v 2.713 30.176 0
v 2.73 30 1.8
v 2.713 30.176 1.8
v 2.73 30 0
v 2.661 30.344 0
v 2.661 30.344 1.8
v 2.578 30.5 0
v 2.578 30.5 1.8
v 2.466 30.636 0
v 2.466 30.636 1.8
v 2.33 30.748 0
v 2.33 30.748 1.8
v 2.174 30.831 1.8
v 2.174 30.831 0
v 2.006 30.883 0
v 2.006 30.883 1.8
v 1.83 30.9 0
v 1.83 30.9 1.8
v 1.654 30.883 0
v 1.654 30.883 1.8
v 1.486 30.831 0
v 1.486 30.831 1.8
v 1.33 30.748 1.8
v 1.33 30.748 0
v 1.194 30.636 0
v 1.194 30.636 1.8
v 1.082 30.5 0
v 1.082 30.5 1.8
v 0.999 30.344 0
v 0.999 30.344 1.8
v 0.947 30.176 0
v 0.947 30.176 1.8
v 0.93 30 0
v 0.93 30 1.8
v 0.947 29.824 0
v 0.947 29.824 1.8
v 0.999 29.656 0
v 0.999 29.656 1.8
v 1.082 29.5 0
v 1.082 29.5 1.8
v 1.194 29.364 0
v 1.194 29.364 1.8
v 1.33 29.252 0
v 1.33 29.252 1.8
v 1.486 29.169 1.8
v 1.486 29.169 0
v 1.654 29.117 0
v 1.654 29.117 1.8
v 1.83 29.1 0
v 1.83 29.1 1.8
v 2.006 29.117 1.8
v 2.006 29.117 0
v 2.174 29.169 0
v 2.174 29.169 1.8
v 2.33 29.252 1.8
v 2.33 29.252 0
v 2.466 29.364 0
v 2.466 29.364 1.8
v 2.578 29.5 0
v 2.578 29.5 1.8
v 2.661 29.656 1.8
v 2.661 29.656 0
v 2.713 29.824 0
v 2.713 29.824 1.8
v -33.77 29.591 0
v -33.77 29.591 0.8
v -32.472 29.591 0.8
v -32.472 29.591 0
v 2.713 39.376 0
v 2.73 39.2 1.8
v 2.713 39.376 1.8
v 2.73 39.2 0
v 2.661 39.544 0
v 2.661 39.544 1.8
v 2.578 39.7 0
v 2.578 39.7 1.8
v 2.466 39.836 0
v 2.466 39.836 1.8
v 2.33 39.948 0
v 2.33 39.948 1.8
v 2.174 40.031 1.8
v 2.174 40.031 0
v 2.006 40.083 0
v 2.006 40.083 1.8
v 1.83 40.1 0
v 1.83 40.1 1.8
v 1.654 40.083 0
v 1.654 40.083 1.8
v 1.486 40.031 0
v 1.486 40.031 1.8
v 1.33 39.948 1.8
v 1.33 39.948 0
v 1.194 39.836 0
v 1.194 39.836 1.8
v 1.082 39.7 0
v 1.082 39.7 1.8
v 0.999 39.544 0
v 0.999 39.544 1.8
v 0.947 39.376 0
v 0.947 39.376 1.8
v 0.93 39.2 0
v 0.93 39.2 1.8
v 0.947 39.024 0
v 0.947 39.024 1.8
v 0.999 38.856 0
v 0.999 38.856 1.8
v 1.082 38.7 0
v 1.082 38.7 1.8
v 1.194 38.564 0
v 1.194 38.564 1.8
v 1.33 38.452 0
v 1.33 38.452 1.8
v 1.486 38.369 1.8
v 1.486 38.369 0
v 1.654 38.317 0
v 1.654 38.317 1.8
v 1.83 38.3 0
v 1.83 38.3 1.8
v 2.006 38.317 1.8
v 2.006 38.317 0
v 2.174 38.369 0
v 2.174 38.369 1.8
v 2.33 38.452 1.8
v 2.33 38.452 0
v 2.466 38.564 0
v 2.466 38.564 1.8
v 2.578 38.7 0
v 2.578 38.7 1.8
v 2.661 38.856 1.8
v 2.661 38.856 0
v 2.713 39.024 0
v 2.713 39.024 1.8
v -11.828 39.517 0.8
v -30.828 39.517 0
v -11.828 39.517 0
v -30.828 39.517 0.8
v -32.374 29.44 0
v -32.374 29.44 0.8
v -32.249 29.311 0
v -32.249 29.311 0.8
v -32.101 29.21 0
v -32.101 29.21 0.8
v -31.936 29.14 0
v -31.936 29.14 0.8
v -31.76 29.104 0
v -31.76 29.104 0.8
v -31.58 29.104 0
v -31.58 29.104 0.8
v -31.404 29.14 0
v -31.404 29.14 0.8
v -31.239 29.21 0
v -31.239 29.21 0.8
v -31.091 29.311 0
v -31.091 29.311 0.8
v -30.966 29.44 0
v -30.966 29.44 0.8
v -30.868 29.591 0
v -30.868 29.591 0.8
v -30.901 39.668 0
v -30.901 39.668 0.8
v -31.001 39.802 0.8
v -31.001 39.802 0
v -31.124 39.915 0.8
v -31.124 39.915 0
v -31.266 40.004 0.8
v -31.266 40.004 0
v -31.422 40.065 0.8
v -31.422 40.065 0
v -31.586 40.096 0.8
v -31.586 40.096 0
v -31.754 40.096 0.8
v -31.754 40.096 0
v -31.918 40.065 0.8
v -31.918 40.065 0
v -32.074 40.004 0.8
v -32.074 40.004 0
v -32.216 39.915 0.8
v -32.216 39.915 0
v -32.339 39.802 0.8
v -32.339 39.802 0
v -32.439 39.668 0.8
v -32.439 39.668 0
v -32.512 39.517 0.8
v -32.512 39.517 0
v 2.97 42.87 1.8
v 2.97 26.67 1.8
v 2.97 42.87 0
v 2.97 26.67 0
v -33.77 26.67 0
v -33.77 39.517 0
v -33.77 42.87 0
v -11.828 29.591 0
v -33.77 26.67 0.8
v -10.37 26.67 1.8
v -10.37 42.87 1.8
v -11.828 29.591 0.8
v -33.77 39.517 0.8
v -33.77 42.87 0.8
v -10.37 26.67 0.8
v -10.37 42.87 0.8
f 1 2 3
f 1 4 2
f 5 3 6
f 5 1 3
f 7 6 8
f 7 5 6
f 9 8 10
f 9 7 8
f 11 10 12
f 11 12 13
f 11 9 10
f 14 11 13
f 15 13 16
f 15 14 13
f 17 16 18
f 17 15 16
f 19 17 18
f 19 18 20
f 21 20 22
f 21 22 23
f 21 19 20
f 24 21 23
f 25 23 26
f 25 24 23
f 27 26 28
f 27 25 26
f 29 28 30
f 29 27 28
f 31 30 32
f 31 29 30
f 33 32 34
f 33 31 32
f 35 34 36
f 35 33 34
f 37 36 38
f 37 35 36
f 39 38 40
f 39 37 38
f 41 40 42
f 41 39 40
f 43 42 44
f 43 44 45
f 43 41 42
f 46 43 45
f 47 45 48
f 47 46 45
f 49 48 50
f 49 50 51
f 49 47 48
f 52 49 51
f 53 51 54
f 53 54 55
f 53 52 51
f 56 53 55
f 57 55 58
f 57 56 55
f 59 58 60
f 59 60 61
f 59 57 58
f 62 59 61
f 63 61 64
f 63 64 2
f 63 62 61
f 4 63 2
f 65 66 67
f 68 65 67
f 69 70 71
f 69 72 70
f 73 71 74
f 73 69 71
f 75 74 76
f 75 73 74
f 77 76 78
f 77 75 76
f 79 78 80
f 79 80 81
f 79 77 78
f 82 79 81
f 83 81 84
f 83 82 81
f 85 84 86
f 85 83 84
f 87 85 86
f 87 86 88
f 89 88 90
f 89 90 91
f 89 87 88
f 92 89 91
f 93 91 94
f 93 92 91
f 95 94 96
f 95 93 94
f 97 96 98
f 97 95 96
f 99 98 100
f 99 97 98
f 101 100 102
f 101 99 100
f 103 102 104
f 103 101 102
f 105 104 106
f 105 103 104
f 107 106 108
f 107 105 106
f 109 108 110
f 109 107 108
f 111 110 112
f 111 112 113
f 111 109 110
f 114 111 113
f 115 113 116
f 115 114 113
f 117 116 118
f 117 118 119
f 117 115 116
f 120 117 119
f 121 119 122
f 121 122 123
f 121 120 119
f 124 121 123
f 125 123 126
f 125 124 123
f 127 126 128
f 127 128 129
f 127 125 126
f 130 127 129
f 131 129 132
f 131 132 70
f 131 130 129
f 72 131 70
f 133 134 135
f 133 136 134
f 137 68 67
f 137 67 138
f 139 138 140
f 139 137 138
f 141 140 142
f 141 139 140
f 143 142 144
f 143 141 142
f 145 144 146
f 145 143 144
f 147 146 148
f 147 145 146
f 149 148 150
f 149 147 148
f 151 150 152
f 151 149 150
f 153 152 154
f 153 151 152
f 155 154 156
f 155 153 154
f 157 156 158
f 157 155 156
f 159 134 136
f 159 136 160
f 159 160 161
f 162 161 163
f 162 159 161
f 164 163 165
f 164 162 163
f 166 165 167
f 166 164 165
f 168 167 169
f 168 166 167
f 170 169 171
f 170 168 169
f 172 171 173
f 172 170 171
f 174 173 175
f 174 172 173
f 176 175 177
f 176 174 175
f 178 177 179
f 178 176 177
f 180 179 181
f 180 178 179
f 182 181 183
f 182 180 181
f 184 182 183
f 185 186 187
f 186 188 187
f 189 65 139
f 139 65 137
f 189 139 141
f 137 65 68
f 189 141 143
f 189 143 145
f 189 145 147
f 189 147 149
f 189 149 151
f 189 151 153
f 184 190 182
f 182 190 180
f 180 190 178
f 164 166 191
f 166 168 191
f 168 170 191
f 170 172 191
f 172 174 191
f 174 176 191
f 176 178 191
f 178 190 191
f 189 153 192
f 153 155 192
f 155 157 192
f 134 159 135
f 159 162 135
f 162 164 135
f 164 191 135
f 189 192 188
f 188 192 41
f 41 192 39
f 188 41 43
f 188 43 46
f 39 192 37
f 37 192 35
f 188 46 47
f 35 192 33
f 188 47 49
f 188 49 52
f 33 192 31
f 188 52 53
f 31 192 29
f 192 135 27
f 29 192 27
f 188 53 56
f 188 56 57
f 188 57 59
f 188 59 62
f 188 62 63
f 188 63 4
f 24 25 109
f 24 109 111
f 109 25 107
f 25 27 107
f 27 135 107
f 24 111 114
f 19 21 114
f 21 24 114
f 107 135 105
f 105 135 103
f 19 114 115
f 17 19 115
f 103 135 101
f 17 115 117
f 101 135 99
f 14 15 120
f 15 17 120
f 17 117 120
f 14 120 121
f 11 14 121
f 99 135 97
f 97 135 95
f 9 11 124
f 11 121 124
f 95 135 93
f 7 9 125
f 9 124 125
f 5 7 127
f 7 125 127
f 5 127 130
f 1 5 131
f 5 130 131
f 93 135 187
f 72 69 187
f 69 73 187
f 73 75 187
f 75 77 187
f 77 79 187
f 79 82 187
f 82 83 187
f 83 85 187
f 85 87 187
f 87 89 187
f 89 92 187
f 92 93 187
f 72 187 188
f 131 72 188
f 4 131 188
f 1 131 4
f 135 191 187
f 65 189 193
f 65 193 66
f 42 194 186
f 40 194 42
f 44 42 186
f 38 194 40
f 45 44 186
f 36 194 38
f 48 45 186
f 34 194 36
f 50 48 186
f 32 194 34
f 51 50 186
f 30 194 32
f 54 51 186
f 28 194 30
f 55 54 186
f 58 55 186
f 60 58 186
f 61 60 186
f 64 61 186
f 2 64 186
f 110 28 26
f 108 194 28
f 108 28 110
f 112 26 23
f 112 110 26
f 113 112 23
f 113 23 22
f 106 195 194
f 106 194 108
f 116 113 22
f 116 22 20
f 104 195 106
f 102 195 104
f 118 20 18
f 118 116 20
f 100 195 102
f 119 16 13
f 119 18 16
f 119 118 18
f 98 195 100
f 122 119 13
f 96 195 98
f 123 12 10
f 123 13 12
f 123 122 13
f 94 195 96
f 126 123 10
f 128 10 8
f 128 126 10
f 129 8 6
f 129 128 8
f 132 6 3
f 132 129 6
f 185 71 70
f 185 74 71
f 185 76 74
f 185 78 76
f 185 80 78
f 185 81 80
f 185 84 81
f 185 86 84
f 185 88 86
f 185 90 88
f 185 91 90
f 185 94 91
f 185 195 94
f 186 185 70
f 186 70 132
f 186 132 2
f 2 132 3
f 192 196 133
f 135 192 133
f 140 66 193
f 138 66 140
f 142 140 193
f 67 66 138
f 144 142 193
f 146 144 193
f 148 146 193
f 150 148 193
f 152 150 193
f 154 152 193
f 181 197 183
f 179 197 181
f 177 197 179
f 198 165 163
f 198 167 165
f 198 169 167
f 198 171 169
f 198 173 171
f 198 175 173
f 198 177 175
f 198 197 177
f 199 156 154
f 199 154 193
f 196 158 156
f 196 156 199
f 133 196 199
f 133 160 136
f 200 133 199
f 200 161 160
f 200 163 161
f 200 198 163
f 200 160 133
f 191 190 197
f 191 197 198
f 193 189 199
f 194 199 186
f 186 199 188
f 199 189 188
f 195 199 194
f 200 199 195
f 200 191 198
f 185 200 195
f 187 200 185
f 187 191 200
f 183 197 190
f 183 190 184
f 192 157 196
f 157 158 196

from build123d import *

# Parameters (mm, degrees)
SKETCH_W     = 36.74
SKETCH_H     = 16.2
SKETCH_R     = 0.9
PAD_DEPTH    = 0.8
SKETCH001_W  = 13.34
SKETCH001_H  = 16.2
SKETCH001_R  = 0.9
PAD001_DEPTH = 1
SKETCH002_W  = 22.987506
SKETCH002_H  = 9.9264
POCKET_DEPTH = 0.801


with BuildPart() as part:
    # Sketch → Pad (new body)
    with BuildSketch(Plane.XY):
        with Locations((-15.4, 34.77)):
            Rectangle(SKETCH_W, SKETCH_H)
        with Locations((1.83, 39.2)):
            Circle(SKETCH_R, mode=Mode.SUBTRACT)
        with Locations((1.83, 30)):
            Circle(SKETCH_R, mode=Mode.SUBTRACT)
        with Locations((-31.67, 39.2)):
            Circle(SKETCH_R, mode=Mode.SUBTRACT)
        with Locations((-31.67, 30)):
            Circle(SKETCH_R, mode=Mode.SUBTRACT)
    extrude(amount=PAD_DEPTH)

    # Sketch001 (on Face10 of Pad) → Pad001 (join)
    with BuildSketch(Plane.XY.offset(0.8)):
        with Locations((-3.7, 34.77)):
            Rectangle(SKETCH001_W, SKETCH001_H)
        with Locations((1.83, 39.2)):
            Circle(SKETCH001_R, mode=Mode.SUBTRACT)
        with Locations((1.83, 30)):
            Circle(SKETCH001_R, mode=Mode.SUBTRACT)
    extrude(amount=PAD001_DEPTH)

    # Sketch002 (on Face3 of Pad001) → Pocket (cut, through all)
    with BuildSketch(Plane.XY.offset(0.8)):
        with Locations((-23.321447, 34.5539)):
            Rectangle(SKETCH002_W, SKETCH002_H)
    extrude(amount=-POCKET_DEPTH, mode=Mode.SUBTRACT)


solid = part.part
